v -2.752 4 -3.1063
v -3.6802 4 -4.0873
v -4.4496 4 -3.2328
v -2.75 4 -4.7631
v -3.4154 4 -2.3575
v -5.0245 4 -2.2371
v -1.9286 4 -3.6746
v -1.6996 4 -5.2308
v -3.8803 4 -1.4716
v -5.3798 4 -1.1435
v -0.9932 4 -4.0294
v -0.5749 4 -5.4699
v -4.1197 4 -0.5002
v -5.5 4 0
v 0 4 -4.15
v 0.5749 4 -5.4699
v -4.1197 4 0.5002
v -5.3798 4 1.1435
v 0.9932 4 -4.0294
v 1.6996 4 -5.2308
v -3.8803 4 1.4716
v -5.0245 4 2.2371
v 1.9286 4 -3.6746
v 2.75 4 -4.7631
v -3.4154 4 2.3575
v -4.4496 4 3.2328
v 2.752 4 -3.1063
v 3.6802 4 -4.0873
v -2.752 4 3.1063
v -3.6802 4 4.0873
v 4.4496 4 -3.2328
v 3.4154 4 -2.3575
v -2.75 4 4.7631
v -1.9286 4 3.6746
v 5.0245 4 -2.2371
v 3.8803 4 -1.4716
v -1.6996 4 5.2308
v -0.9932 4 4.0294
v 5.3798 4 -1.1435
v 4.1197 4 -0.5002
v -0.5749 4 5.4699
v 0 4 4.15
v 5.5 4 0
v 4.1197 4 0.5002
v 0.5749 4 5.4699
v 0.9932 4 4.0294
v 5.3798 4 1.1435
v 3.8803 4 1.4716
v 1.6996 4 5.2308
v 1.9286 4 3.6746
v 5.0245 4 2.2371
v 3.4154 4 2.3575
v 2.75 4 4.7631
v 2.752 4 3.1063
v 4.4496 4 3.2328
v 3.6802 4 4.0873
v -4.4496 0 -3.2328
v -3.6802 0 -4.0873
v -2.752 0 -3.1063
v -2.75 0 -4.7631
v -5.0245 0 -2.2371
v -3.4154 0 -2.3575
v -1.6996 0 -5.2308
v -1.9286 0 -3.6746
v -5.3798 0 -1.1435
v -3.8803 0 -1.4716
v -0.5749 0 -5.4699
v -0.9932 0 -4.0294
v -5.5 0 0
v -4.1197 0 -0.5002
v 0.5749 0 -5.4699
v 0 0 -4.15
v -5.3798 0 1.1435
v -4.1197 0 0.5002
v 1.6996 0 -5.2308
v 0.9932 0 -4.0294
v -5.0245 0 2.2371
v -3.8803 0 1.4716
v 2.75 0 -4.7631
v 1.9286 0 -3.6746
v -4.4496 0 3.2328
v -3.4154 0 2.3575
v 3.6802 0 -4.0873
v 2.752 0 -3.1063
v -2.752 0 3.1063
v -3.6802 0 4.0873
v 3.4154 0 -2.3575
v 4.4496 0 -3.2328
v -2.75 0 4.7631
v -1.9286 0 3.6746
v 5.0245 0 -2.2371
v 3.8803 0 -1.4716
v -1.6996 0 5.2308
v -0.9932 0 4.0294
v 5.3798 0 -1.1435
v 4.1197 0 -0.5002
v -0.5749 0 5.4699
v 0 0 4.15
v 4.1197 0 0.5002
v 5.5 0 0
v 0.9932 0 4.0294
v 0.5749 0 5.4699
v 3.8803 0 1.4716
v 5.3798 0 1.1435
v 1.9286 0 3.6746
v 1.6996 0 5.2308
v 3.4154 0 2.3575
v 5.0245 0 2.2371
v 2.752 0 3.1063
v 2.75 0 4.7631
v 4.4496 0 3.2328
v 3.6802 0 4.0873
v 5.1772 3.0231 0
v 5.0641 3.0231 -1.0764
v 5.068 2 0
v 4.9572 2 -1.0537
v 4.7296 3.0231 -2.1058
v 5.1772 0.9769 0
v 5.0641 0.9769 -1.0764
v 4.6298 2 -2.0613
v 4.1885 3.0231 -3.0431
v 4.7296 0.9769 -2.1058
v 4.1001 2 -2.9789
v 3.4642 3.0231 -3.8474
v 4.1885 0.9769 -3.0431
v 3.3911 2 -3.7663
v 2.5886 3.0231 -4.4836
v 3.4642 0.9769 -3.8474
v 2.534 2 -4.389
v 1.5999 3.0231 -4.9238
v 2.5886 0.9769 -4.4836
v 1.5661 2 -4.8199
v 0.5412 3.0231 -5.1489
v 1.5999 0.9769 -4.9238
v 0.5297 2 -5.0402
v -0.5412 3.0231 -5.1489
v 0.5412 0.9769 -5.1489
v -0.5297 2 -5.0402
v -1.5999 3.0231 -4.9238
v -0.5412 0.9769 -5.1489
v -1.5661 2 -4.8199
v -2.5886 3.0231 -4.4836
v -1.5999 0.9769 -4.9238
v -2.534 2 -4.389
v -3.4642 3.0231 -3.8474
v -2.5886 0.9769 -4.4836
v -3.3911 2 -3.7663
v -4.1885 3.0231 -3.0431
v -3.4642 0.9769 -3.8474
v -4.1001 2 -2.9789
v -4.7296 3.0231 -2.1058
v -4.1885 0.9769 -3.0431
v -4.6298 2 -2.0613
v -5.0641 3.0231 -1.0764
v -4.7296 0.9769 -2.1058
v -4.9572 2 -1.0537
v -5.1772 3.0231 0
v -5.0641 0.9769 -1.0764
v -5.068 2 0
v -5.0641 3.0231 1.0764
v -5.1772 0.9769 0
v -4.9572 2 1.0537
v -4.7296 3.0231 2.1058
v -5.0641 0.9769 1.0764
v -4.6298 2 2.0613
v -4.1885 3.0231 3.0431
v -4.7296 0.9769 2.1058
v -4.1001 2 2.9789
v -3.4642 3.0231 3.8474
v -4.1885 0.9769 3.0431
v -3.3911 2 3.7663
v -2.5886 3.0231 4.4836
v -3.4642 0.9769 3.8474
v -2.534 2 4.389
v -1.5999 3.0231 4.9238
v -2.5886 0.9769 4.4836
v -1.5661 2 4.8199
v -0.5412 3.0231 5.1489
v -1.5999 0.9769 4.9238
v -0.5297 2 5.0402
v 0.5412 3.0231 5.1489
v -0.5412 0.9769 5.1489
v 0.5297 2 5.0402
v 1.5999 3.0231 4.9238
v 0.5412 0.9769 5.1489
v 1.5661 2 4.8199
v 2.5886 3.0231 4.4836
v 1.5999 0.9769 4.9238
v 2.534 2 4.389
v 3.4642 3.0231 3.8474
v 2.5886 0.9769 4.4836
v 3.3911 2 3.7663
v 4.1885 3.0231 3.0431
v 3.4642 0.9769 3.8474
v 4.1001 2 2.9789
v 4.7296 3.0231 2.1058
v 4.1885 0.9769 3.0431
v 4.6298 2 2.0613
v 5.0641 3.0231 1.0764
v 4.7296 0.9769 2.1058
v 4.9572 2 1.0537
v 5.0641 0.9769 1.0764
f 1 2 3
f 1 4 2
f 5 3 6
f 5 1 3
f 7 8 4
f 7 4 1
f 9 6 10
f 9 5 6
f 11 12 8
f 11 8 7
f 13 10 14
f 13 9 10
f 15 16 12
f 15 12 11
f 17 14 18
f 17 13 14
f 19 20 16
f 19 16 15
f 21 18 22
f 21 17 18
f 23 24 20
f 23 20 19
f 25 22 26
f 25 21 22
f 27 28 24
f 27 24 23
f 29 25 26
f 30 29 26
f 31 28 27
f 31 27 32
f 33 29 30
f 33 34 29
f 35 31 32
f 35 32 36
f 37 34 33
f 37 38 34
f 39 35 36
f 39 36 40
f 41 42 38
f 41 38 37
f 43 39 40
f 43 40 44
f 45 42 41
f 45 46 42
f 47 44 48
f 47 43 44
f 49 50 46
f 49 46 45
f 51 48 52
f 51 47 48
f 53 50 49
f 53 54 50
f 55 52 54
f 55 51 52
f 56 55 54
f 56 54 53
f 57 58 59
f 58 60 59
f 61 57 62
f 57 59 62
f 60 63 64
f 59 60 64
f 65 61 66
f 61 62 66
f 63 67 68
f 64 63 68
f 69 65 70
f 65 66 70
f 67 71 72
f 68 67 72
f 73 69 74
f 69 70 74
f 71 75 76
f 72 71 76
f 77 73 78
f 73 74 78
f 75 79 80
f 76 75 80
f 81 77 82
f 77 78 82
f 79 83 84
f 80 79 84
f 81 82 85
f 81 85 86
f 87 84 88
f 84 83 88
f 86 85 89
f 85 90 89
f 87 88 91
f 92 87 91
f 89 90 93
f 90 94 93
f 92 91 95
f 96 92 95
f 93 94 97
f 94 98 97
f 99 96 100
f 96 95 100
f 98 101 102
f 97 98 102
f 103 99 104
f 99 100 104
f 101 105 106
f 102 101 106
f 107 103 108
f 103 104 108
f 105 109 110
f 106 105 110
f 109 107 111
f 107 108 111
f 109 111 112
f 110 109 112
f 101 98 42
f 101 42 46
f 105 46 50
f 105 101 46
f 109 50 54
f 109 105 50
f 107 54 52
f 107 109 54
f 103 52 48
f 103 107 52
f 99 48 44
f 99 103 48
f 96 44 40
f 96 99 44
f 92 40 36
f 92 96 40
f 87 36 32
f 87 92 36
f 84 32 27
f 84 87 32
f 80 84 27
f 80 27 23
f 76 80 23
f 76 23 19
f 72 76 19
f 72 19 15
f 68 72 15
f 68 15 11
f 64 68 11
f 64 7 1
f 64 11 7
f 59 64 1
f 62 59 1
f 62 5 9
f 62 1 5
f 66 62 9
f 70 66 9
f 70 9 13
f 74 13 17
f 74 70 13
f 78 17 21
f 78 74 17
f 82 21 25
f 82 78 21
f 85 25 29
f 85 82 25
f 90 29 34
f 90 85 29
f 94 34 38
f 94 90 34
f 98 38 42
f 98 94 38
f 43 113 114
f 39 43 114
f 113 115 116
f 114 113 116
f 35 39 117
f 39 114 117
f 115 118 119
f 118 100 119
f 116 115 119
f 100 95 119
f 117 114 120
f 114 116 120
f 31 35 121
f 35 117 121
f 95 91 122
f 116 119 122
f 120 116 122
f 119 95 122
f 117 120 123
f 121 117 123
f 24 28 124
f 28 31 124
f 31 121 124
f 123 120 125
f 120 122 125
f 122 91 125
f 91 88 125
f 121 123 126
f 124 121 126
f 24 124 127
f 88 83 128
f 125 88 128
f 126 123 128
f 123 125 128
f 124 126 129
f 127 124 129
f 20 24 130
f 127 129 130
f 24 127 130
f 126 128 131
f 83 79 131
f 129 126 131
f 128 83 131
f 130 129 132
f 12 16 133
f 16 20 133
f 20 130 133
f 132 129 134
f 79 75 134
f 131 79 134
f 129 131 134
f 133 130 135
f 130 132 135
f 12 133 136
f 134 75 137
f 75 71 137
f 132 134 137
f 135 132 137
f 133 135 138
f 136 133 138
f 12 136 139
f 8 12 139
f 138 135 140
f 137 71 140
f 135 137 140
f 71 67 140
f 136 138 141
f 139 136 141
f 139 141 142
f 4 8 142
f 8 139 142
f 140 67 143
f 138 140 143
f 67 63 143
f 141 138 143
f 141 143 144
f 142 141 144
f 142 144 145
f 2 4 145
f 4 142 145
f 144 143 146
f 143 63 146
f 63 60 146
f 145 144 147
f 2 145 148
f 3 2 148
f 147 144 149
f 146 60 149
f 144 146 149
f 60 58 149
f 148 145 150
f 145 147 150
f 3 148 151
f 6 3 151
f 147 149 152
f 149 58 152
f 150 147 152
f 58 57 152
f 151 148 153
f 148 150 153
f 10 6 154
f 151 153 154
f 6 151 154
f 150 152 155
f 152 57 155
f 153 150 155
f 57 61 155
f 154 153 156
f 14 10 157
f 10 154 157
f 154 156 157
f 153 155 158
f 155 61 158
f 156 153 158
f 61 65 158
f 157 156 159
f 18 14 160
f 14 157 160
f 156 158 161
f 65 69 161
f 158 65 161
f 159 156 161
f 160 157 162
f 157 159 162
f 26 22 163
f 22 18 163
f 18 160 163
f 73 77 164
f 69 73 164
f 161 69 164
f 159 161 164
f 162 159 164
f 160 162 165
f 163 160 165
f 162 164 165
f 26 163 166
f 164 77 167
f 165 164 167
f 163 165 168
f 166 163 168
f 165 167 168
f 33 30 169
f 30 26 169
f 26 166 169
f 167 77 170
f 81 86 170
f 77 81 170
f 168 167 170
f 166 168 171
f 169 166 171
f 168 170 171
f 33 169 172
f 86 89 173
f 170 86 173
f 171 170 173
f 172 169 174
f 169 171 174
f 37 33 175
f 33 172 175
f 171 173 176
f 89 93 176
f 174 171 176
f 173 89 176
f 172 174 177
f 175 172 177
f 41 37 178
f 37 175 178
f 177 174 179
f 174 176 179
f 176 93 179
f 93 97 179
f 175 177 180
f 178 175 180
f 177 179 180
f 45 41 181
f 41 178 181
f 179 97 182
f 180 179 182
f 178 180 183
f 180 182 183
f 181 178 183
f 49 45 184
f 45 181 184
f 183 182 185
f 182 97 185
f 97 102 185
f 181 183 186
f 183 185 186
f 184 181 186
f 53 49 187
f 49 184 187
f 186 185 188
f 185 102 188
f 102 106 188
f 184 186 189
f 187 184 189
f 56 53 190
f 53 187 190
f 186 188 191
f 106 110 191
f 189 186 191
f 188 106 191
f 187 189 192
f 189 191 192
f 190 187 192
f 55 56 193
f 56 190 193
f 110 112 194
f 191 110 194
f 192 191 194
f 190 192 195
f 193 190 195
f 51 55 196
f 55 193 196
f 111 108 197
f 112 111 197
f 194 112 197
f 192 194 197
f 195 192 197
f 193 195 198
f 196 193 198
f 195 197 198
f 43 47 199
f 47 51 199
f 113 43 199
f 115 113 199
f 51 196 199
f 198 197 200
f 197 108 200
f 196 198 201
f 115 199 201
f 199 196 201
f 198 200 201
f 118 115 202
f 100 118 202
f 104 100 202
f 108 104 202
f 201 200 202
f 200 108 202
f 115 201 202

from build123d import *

# Parameters (mm, degrees)
SKETCH1_R           = 5.5
BOSS_EXTRUDE1_DEPTH = 4
SKETCH4_R           = 4.15
CUT_EXTRUDE3_DEPTH  = 9.746427842


with BuildPart() as part:
    # Sketch1 → Boss-Extrude1 (new body)
    with BuildSketch(Plane(origin=(0, 0, 0), x_dir=(1, 0, 0), z_dir=(0, 1, 0))):
        Circle(SKETCH1_R)
    extrude(amount=BOSS_EXTRUDE1_DEPTH)

    # Sketch4 → Cut-Extrude3 (cut, through all)
    with BuildSketch(Plane(origin=(0, 0, 0), x_dir=(1, 0, 0), z_dir=(0, 1, 0))):
        Circle(SKETCH4_R)
    extrude(amount=CUT_EXTRUDE3_DEPTH, mode=Mode.SUBTRACT)

    # Cut-Sweep1: sweep along a path in Sketch1<2>
    with BuildLine(Plane(origin=(0, 0, 0), x_dir=(1, 0, 0), z_dir=(0, 1, 0))) as cut_sweep1_path:
        CenterArc((0, 0), 5.5, 0, 360)
    # Sketch5 → Cut-Sweep1 (sweep, cut)
    with BuildSketch(Plane.XY):
        with BuildLine():
            Line((5.5, 4), (5.5, 0))
            ThreePointArc((5.5, 0), (5.067989981, 2), (5.5, 4))
        make_face()
    sweep(path=cut_sweep1_path.line, mode=Mode.SUBTRACT)


solid = part.part
